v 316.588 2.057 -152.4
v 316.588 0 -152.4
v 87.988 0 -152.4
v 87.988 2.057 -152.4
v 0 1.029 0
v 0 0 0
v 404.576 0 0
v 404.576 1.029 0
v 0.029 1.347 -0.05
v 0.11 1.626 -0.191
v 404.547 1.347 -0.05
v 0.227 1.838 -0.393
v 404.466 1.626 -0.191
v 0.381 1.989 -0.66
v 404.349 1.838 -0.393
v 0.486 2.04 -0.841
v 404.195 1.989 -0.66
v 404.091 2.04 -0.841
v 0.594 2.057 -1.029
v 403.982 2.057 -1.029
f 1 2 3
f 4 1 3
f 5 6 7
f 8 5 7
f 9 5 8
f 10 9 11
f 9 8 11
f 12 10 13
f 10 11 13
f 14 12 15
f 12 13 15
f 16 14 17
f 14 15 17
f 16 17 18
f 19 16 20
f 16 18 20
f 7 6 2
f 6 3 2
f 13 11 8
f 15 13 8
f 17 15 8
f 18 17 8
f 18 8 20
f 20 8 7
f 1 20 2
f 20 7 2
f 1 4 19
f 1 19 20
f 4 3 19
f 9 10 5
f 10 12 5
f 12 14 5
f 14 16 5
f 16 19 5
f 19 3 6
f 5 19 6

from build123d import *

# Parameters (mm, degrees)
BOSS_EXTRUDE1_DEPTH = 2.0574
FILLET1_R           = 1.0287


with BuildPart() as part:
    # Sketch1 → Boss-Extrude1 (new body)
    with BuildSketch(Plane(origin=(0, 0, 0), x_dir=(1, 0, 0), z_dir=(0, 1, 0))):
        Polygon((0, 0), (404.576362049, 0), (316.588181024, 152.4), (87.988181024, 152.4), align=None)
    extrude(amount=BOSS_EXTRUDE1_DEPTH)

    # Fillet1
    fillet1_edges = [part.edges().sort_by_distance(p)[0] for p in [
        (202.288181024, 2.0574, 0),
    ]]
    fillet(fillet1_edges, radius=FILLET1_R)


solid = part.part
